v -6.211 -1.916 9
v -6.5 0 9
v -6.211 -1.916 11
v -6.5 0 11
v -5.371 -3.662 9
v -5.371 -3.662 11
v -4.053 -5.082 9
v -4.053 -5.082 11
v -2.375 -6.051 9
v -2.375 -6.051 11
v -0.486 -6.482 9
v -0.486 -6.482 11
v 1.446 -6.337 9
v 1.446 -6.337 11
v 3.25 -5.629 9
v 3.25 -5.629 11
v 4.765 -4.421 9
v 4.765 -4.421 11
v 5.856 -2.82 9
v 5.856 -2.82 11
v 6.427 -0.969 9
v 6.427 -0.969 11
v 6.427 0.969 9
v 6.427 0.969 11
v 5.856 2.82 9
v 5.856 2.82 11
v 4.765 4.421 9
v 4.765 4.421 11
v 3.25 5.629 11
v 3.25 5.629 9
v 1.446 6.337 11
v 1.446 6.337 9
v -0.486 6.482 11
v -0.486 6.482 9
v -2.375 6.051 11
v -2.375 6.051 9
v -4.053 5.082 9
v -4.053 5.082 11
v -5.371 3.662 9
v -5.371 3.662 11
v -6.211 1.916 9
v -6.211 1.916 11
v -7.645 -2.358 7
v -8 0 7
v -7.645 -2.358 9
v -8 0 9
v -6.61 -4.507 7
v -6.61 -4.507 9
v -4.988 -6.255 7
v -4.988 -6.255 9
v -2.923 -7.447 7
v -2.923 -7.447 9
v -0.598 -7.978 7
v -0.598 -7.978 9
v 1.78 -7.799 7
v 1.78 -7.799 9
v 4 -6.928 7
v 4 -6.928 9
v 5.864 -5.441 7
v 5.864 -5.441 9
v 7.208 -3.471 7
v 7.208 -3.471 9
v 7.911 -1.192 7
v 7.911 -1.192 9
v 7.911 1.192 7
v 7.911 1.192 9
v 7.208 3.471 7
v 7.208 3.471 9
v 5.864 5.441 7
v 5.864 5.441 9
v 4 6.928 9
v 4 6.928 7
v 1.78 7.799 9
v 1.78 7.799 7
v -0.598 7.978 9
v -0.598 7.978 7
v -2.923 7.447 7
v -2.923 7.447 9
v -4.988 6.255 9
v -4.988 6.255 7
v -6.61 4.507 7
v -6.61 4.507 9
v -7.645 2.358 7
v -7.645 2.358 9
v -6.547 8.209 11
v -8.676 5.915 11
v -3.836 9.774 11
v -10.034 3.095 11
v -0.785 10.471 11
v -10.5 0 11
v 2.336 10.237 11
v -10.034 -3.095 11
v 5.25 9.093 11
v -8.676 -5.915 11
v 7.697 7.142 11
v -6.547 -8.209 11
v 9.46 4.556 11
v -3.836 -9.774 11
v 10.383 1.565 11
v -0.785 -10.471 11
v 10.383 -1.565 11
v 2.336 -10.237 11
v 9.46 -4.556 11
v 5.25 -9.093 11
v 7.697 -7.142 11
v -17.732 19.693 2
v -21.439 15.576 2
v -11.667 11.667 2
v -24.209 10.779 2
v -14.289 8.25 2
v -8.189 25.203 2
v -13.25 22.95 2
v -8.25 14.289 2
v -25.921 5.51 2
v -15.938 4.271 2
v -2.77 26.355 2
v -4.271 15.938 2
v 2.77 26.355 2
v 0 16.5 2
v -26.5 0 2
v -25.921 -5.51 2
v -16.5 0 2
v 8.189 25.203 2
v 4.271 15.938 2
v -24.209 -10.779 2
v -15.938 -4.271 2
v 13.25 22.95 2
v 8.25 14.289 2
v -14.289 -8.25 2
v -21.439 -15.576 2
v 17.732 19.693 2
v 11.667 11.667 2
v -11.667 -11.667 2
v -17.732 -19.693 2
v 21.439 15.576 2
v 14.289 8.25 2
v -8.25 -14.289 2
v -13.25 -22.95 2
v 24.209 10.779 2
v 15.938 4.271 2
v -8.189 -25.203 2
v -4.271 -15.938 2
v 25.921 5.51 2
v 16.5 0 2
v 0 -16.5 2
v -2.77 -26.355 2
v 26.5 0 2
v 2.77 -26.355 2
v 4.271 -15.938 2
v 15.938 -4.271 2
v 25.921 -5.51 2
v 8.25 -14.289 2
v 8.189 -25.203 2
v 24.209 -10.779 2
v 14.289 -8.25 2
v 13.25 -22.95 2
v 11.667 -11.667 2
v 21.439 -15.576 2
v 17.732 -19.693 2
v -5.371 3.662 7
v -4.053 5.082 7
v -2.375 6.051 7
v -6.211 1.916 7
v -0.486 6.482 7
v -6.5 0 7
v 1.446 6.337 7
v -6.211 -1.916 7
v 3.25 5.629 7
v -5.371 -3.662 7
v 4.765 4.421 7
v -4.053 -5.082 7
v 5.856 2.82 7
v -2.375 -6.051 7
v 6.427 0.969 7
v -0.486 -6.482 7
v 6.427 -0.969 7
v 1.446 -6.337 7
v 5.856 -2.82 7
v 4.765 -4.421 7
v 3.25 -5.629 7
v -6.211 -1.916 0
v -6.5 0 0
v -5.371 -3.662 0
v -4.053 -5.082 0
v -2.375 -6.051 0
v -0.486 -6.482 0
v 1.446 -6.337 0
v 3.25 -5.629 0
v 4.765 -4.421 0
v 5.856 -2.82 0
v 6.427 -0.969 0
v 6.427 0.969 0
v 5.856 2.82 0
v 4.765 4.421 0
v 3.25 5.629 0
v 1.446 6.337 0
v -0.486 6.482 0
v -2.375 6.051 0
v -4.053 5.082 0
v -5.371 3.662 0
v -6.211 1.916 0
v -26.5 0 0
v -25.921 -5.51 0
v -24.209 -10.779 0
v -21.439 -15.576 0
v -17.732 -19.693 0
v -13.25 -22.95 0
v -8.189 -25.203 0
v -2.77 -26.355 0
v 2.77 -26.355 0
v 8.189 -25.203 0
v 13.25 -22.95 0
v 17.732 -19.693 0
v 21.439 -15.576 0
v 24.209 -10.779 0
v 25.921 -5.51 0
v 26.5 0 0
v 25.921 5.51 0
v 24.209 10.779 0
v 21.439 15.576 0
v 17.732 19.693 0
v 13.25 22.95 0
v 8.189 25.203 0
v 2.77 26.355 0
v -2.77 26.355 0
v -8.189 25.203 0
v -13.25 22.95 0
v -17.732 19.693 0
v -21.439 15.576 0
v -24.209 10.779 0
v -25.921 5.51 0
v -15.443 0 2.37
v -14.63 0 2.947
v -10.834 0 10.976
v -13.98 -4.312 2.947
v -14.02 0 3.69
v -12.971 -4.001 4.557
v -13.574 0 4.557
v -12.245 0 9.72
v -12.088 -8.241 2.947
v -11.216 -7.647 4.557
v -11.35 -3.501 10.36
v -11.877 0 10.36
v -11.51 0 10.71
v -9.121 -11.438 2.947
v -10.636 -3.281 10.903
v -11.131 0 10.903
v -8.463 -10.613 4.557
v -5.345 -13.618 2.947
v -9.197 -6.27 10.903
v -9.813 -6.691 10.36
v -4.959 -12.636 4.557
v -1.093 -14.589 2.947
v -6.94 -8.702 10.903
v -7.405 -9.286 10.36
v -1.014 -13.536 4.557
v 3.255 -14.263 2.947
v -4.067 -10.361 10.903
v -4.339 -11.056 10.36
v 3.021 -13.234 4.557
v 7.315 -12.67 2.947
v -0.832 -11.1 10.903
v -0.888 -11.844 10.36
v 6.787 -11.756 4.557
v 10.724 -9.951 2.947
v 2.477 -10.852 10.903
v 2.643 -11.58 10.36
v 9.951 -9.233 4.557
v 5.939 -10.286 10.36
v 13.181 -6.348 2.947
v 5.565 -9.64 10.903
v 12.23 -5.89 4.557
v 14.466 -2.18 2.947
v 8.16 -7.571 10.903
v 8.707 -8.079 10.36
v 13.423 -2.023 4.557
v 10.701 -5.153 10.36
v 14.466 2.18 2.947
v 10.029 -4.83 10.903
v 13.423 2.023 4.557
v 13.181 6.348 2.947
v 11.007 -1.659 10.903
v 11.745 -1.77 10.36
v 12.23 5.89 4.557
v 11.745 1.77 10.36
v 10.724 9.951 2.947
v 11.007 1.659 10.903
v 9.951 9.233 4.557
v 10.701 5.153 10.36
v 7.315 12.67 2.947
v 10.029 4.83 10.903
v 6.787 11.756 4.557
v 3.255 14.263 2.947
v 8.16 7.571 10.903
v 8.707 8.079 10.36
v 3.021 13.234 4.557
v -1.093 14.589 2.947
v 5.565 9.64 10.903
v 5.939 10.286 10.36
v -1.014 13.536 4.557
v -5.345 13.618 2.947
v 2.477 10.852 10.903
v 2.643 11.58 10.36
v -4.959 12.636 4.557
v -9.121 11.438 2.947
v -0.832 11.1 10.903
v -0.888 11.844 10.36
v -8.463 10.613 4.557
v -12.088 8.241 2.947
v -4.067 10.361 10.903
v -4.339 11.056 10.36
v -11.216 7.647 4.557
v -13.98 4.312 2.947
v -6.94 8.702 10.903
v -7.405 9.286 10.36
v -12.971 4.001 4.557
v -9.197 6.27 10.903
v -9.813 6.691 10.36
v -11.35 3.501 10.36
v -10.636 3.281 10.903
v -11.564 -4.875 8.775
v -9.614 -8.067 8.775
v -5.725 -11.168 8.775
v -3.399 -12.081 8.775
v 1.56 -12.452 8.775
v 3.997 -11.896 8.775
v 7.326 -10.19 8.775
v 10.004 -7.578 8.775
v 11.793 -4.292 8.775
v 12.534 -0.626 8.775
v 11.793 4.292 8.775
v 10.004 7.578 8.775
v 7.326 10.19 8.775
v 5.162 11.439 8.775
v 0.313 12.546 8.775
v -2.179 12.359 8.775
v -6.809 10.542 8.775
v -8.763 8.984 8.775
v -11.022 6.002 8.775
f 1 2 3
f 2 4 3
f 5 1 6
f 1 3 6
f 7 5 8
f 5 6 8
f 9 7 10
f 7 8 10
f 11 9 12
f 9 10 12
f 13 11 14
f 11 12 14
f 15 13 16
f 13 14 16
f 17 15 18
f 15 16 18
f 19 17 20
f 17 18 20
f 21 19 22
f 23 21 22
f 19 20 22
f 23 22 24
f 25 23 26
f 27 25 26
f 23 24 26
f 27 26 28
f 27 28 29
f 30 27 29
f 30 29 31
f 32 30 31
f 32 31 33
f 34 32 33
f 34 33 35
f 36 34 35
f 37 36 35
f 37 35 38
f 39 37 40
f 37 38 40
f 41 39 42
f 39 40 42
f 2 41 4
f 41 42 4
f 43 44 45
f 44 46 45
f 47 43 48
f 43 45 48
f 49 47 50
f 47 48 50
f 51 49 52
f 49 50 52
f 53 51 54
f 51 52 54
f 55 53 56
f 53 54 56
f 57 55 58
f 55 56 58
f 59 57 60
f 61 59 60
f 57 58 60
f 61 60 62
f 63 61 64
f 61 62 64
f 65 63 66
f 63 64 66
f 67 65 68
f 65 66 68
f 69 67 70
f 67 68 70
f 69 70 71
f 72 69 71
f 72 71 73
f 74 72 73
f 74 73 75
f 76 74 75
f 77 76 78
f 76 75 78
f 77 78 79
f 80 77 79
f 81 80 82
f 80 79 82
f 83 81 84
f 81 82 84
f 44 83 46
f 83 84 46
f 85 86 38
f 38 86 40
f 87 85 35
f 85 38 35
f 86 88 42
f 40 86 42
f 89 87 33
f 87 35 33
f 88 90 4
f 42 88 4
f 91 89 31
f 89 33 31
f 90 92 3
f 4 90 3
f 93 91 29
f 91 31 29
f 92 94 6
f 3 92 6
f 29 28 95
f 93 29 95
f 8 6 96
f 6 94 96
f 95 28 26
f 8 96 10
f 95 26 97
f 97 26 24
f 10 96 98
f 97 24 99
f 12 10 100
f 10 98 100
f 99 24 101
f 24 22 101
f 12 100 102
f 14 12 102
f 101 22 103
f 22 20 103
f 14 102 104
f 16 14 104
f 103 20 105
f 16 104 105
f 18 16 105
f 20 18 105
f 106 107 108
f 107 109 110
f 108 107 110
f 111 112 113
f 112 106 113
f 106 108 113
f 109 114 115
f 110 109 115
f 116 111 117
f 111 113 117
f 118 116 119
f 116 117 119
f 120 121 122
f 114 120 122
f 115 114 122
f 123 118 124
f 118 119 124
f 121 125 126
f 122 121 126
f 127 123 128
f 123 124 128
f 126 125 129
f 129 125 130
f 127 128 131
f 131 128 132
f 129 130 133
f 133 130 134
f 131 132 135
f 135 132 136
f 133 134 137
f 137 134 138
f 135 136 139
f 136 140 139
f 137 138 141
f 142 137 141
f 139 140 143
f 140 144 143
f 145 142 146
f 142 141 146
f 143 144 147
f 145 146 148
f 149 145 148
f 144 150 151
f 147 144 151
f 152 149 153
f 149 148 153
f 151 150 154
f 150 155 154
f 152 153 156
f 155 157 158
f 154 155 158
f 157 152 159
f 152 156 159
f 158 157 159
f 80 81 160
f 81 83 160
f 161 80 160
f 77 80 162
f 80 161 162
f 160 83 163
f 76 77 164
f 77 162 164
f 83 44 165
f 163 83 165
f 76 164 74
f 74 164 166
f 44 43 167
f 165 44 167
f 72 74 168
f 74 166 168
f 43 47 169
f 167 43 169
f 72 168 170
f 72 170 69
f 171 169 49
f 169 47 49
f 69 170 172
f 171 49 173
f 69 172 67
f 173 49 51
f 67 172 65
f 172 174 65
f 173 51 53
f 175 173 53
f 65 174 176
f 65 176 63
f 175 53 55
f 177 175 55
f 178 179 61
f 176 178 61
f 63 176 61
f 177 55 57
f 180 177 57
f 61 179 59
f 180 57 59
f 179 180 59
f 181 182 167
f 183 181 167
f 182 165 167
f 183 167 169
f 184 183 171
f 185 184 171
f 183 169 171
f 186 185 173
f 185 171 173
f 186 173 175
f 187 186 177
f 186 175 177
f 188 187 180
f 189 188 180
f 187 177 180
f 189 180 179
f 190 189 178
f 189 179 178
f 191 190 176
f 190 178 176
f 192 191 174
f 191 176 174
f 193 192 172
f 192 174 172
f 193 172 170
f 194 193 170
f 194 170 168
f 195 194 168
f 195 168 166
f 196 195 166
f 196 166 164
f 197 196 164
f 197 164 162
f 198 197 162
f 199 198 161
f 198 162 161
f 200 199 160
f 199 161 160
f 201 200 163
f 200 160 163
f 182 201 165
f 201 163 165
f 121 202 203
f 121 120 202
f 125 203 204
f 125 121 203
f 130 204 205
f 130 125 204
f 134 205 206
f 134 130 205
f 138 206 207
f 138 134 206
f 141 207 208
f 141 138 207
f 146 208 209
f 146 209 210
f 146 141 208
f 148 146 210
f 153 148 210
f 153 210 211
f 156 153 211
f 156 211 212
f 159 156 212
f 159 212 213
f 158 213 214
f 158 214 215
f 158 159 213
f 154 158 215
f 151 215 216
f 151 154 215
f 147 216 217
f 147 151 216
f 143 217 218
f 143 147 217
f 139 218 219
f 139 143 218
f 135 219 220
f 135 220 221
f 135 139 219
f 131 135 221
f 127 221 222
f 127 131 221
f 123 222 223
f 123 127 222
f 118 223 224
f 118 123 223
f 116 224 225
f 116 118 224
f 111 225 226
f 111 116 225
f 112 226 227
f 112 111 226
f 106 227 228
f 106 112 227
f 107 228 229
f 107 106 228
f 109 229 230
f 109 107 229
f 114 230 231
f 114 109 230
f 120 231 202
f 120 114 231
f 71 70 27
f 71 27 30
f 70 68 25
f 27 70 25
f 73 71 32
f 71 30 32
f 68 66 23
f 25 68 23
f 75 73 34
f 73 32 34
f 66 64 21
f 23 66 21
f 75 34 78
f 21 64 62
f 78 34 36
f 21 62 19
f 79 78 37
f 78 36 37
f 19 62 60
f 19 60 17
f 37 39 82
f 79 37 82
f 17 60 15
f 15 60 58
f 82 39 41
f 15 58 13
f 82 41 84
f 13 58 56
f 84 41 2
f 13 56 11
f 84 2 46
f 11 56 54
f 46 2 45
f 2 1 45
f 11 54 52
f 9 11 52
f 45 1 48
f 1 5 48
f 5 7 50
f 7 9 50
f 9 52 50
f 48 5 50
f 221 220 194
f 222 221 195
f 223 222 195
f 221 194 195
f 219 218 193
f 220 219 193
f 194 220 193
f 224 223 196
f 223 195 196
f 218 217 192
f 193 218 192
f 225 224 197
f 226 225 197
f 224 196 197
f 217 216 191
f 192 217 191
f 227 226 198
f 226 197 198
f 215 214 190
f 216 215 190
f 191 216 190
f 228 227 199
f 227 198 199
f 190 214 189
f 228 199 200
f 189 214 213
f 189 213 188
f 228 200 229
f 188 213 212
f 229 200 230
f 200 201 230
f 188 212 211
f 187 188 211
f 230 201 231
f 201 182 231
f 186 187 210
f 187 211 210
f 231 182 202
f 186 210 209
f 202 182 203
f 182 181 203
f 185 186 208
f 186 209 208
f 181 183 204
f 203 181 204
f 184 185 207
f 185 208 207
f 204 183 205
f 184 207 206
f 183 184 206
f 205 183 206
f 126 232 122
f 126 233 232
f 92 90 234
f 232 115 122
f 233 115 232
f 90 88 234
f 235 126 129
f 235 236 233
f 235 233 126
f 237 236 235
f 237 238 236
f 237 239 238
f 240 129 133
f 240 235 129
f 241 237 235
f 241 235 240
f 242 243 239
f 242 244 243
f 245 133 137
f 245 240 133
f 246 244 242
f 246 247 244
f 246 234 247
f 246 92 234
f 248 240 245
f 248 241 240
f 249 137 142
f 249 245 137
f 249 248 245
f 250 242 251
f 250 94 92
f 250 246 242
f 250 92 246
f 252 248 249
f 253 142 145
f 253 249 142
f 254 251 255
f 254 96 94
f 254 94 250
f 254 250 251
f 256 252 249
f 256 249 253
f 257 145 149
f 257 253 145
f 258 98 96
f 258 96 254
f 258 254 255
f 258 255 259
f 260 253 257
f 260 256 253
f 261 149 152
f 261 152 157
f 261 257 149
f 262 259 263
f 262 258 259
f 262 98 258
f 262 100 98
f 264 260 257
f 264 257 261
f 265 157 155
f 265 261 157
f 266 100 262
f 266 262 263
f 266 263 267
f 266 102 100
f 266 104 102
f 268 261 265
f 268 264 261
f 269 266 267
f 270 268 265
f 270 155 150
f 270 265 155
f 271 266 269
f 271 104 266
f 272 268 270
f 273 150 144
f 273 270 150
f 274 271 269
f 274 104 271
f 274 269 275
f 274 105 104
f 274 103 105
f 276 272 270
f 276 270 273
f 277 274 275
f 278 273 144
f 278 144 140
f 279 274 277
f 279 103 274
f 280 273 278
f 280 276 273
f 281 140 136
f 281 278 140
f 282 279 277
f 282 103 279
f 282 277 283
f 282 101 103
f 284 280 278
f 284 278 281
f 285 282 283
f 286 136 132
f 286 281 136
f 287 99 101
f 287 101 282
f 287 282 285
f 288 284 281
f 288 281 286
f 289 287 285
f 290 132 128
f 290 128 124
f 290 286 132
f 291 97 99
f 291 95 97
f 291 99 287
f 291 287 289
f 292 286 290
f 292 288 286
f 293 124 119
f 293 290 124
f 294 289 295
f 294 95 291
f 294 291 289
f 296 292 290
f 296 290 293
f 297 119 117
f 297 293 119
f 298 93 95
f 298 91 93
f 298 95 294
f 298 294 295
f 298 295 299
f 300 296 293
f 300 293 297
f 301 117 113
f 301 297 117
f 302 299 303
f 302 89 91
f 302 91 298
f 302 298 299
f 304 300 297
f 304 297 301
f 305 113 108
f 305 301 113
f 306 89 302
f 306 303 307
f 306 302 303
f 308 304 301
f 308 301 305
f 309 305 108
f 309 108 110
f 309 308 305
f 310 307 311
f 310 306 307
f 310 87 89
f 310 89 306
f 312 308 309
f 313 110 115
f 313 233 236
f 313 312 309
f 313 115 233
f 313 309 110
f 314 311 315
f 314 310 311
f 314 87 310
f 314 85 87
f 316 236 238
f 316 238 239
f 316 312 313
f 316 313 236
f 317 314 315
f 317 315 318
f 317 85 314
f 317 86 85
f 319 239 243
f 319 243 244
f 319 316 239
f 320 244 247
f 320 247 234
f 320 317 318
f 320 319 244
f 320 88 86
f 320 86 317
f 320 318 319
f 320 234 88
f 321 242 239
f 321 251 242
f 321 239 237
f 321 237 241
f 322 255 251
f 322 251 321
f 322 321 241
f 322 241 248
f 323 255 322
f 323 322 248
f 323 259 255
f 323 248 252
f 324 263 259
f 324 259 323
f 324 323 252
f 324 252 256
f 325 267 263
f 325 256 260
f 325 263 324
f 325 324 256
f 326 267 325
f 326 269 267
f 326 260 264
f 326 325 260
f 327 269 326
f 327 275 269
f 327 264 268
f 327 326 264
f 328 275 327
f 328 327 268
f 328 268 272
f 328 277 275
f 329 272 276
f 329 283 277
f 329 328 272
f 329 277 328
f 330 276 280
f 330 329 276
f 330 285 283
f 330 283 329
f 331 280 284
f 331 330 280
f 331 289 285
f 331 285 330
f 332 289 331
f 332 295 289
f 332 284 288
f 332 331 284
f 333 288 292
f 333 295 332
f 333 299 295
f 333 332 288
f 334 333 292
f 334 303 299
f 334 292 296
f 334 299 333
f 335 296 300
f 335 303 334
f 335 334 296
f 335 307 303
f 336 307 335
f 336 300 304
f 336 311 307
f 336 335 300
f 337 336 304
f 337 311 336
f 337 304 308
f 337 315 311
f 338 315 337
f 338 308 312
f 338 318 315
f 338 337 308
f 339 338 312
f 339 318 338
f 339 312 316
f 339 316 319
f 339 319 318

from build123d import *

# Parameters (mm, degrees)
F0_W   = 10
F0_H   = 2
F0_W_2 = 2.5


with BuildPart() as f1:
    # F0 (on Front) → F1 (revolve)
    with BuildSketch(Plane.XZ):
        Polygon((-16.5, 0), (-6.5, 0), (-6.5, 2), (-10.5, 2), (-16.5, 2), align=None)
        with Locations((-21.5, 1)):
            Rectangle(F0_W, F0_H)
        Polygon((-10.5, 2), (-6.5, 2), (-6.5, 7), (-8, 7), (-10.5, 7), align=None)
        with BuildLine():
            add(Edge.make_bspline(
                [(-16.5, 2), (-11.400399, 3.076565), (-14.082662, 11.012357), (-10.5, 11)],
                knots=[0, 0, 0, 0, 10.816654, 10.816654, 10.816654, 10.816654], degree=3))
            Line((-16.5, 2), (-10.5, 2))
            Line((-10.5, 2), (-10.5, 7))
            Line((-10.5, 7), (-10.5, 9))
            Line((-10.5, 9), (-10.5, 11))
        make_face()
        Polygon((-8.5, 11), (-10.5, 11), (-10.5, 9), (-8, 9), (-6.5, 9), (-6.5, 11), align=None)
        with Locations((-9.25, 8)):
            Rectangle(F0_W_2, F0_H)
    revolve(axis=Axis((0, 0, 6.281995), (0, 0, 1)))


solid = f1.part
